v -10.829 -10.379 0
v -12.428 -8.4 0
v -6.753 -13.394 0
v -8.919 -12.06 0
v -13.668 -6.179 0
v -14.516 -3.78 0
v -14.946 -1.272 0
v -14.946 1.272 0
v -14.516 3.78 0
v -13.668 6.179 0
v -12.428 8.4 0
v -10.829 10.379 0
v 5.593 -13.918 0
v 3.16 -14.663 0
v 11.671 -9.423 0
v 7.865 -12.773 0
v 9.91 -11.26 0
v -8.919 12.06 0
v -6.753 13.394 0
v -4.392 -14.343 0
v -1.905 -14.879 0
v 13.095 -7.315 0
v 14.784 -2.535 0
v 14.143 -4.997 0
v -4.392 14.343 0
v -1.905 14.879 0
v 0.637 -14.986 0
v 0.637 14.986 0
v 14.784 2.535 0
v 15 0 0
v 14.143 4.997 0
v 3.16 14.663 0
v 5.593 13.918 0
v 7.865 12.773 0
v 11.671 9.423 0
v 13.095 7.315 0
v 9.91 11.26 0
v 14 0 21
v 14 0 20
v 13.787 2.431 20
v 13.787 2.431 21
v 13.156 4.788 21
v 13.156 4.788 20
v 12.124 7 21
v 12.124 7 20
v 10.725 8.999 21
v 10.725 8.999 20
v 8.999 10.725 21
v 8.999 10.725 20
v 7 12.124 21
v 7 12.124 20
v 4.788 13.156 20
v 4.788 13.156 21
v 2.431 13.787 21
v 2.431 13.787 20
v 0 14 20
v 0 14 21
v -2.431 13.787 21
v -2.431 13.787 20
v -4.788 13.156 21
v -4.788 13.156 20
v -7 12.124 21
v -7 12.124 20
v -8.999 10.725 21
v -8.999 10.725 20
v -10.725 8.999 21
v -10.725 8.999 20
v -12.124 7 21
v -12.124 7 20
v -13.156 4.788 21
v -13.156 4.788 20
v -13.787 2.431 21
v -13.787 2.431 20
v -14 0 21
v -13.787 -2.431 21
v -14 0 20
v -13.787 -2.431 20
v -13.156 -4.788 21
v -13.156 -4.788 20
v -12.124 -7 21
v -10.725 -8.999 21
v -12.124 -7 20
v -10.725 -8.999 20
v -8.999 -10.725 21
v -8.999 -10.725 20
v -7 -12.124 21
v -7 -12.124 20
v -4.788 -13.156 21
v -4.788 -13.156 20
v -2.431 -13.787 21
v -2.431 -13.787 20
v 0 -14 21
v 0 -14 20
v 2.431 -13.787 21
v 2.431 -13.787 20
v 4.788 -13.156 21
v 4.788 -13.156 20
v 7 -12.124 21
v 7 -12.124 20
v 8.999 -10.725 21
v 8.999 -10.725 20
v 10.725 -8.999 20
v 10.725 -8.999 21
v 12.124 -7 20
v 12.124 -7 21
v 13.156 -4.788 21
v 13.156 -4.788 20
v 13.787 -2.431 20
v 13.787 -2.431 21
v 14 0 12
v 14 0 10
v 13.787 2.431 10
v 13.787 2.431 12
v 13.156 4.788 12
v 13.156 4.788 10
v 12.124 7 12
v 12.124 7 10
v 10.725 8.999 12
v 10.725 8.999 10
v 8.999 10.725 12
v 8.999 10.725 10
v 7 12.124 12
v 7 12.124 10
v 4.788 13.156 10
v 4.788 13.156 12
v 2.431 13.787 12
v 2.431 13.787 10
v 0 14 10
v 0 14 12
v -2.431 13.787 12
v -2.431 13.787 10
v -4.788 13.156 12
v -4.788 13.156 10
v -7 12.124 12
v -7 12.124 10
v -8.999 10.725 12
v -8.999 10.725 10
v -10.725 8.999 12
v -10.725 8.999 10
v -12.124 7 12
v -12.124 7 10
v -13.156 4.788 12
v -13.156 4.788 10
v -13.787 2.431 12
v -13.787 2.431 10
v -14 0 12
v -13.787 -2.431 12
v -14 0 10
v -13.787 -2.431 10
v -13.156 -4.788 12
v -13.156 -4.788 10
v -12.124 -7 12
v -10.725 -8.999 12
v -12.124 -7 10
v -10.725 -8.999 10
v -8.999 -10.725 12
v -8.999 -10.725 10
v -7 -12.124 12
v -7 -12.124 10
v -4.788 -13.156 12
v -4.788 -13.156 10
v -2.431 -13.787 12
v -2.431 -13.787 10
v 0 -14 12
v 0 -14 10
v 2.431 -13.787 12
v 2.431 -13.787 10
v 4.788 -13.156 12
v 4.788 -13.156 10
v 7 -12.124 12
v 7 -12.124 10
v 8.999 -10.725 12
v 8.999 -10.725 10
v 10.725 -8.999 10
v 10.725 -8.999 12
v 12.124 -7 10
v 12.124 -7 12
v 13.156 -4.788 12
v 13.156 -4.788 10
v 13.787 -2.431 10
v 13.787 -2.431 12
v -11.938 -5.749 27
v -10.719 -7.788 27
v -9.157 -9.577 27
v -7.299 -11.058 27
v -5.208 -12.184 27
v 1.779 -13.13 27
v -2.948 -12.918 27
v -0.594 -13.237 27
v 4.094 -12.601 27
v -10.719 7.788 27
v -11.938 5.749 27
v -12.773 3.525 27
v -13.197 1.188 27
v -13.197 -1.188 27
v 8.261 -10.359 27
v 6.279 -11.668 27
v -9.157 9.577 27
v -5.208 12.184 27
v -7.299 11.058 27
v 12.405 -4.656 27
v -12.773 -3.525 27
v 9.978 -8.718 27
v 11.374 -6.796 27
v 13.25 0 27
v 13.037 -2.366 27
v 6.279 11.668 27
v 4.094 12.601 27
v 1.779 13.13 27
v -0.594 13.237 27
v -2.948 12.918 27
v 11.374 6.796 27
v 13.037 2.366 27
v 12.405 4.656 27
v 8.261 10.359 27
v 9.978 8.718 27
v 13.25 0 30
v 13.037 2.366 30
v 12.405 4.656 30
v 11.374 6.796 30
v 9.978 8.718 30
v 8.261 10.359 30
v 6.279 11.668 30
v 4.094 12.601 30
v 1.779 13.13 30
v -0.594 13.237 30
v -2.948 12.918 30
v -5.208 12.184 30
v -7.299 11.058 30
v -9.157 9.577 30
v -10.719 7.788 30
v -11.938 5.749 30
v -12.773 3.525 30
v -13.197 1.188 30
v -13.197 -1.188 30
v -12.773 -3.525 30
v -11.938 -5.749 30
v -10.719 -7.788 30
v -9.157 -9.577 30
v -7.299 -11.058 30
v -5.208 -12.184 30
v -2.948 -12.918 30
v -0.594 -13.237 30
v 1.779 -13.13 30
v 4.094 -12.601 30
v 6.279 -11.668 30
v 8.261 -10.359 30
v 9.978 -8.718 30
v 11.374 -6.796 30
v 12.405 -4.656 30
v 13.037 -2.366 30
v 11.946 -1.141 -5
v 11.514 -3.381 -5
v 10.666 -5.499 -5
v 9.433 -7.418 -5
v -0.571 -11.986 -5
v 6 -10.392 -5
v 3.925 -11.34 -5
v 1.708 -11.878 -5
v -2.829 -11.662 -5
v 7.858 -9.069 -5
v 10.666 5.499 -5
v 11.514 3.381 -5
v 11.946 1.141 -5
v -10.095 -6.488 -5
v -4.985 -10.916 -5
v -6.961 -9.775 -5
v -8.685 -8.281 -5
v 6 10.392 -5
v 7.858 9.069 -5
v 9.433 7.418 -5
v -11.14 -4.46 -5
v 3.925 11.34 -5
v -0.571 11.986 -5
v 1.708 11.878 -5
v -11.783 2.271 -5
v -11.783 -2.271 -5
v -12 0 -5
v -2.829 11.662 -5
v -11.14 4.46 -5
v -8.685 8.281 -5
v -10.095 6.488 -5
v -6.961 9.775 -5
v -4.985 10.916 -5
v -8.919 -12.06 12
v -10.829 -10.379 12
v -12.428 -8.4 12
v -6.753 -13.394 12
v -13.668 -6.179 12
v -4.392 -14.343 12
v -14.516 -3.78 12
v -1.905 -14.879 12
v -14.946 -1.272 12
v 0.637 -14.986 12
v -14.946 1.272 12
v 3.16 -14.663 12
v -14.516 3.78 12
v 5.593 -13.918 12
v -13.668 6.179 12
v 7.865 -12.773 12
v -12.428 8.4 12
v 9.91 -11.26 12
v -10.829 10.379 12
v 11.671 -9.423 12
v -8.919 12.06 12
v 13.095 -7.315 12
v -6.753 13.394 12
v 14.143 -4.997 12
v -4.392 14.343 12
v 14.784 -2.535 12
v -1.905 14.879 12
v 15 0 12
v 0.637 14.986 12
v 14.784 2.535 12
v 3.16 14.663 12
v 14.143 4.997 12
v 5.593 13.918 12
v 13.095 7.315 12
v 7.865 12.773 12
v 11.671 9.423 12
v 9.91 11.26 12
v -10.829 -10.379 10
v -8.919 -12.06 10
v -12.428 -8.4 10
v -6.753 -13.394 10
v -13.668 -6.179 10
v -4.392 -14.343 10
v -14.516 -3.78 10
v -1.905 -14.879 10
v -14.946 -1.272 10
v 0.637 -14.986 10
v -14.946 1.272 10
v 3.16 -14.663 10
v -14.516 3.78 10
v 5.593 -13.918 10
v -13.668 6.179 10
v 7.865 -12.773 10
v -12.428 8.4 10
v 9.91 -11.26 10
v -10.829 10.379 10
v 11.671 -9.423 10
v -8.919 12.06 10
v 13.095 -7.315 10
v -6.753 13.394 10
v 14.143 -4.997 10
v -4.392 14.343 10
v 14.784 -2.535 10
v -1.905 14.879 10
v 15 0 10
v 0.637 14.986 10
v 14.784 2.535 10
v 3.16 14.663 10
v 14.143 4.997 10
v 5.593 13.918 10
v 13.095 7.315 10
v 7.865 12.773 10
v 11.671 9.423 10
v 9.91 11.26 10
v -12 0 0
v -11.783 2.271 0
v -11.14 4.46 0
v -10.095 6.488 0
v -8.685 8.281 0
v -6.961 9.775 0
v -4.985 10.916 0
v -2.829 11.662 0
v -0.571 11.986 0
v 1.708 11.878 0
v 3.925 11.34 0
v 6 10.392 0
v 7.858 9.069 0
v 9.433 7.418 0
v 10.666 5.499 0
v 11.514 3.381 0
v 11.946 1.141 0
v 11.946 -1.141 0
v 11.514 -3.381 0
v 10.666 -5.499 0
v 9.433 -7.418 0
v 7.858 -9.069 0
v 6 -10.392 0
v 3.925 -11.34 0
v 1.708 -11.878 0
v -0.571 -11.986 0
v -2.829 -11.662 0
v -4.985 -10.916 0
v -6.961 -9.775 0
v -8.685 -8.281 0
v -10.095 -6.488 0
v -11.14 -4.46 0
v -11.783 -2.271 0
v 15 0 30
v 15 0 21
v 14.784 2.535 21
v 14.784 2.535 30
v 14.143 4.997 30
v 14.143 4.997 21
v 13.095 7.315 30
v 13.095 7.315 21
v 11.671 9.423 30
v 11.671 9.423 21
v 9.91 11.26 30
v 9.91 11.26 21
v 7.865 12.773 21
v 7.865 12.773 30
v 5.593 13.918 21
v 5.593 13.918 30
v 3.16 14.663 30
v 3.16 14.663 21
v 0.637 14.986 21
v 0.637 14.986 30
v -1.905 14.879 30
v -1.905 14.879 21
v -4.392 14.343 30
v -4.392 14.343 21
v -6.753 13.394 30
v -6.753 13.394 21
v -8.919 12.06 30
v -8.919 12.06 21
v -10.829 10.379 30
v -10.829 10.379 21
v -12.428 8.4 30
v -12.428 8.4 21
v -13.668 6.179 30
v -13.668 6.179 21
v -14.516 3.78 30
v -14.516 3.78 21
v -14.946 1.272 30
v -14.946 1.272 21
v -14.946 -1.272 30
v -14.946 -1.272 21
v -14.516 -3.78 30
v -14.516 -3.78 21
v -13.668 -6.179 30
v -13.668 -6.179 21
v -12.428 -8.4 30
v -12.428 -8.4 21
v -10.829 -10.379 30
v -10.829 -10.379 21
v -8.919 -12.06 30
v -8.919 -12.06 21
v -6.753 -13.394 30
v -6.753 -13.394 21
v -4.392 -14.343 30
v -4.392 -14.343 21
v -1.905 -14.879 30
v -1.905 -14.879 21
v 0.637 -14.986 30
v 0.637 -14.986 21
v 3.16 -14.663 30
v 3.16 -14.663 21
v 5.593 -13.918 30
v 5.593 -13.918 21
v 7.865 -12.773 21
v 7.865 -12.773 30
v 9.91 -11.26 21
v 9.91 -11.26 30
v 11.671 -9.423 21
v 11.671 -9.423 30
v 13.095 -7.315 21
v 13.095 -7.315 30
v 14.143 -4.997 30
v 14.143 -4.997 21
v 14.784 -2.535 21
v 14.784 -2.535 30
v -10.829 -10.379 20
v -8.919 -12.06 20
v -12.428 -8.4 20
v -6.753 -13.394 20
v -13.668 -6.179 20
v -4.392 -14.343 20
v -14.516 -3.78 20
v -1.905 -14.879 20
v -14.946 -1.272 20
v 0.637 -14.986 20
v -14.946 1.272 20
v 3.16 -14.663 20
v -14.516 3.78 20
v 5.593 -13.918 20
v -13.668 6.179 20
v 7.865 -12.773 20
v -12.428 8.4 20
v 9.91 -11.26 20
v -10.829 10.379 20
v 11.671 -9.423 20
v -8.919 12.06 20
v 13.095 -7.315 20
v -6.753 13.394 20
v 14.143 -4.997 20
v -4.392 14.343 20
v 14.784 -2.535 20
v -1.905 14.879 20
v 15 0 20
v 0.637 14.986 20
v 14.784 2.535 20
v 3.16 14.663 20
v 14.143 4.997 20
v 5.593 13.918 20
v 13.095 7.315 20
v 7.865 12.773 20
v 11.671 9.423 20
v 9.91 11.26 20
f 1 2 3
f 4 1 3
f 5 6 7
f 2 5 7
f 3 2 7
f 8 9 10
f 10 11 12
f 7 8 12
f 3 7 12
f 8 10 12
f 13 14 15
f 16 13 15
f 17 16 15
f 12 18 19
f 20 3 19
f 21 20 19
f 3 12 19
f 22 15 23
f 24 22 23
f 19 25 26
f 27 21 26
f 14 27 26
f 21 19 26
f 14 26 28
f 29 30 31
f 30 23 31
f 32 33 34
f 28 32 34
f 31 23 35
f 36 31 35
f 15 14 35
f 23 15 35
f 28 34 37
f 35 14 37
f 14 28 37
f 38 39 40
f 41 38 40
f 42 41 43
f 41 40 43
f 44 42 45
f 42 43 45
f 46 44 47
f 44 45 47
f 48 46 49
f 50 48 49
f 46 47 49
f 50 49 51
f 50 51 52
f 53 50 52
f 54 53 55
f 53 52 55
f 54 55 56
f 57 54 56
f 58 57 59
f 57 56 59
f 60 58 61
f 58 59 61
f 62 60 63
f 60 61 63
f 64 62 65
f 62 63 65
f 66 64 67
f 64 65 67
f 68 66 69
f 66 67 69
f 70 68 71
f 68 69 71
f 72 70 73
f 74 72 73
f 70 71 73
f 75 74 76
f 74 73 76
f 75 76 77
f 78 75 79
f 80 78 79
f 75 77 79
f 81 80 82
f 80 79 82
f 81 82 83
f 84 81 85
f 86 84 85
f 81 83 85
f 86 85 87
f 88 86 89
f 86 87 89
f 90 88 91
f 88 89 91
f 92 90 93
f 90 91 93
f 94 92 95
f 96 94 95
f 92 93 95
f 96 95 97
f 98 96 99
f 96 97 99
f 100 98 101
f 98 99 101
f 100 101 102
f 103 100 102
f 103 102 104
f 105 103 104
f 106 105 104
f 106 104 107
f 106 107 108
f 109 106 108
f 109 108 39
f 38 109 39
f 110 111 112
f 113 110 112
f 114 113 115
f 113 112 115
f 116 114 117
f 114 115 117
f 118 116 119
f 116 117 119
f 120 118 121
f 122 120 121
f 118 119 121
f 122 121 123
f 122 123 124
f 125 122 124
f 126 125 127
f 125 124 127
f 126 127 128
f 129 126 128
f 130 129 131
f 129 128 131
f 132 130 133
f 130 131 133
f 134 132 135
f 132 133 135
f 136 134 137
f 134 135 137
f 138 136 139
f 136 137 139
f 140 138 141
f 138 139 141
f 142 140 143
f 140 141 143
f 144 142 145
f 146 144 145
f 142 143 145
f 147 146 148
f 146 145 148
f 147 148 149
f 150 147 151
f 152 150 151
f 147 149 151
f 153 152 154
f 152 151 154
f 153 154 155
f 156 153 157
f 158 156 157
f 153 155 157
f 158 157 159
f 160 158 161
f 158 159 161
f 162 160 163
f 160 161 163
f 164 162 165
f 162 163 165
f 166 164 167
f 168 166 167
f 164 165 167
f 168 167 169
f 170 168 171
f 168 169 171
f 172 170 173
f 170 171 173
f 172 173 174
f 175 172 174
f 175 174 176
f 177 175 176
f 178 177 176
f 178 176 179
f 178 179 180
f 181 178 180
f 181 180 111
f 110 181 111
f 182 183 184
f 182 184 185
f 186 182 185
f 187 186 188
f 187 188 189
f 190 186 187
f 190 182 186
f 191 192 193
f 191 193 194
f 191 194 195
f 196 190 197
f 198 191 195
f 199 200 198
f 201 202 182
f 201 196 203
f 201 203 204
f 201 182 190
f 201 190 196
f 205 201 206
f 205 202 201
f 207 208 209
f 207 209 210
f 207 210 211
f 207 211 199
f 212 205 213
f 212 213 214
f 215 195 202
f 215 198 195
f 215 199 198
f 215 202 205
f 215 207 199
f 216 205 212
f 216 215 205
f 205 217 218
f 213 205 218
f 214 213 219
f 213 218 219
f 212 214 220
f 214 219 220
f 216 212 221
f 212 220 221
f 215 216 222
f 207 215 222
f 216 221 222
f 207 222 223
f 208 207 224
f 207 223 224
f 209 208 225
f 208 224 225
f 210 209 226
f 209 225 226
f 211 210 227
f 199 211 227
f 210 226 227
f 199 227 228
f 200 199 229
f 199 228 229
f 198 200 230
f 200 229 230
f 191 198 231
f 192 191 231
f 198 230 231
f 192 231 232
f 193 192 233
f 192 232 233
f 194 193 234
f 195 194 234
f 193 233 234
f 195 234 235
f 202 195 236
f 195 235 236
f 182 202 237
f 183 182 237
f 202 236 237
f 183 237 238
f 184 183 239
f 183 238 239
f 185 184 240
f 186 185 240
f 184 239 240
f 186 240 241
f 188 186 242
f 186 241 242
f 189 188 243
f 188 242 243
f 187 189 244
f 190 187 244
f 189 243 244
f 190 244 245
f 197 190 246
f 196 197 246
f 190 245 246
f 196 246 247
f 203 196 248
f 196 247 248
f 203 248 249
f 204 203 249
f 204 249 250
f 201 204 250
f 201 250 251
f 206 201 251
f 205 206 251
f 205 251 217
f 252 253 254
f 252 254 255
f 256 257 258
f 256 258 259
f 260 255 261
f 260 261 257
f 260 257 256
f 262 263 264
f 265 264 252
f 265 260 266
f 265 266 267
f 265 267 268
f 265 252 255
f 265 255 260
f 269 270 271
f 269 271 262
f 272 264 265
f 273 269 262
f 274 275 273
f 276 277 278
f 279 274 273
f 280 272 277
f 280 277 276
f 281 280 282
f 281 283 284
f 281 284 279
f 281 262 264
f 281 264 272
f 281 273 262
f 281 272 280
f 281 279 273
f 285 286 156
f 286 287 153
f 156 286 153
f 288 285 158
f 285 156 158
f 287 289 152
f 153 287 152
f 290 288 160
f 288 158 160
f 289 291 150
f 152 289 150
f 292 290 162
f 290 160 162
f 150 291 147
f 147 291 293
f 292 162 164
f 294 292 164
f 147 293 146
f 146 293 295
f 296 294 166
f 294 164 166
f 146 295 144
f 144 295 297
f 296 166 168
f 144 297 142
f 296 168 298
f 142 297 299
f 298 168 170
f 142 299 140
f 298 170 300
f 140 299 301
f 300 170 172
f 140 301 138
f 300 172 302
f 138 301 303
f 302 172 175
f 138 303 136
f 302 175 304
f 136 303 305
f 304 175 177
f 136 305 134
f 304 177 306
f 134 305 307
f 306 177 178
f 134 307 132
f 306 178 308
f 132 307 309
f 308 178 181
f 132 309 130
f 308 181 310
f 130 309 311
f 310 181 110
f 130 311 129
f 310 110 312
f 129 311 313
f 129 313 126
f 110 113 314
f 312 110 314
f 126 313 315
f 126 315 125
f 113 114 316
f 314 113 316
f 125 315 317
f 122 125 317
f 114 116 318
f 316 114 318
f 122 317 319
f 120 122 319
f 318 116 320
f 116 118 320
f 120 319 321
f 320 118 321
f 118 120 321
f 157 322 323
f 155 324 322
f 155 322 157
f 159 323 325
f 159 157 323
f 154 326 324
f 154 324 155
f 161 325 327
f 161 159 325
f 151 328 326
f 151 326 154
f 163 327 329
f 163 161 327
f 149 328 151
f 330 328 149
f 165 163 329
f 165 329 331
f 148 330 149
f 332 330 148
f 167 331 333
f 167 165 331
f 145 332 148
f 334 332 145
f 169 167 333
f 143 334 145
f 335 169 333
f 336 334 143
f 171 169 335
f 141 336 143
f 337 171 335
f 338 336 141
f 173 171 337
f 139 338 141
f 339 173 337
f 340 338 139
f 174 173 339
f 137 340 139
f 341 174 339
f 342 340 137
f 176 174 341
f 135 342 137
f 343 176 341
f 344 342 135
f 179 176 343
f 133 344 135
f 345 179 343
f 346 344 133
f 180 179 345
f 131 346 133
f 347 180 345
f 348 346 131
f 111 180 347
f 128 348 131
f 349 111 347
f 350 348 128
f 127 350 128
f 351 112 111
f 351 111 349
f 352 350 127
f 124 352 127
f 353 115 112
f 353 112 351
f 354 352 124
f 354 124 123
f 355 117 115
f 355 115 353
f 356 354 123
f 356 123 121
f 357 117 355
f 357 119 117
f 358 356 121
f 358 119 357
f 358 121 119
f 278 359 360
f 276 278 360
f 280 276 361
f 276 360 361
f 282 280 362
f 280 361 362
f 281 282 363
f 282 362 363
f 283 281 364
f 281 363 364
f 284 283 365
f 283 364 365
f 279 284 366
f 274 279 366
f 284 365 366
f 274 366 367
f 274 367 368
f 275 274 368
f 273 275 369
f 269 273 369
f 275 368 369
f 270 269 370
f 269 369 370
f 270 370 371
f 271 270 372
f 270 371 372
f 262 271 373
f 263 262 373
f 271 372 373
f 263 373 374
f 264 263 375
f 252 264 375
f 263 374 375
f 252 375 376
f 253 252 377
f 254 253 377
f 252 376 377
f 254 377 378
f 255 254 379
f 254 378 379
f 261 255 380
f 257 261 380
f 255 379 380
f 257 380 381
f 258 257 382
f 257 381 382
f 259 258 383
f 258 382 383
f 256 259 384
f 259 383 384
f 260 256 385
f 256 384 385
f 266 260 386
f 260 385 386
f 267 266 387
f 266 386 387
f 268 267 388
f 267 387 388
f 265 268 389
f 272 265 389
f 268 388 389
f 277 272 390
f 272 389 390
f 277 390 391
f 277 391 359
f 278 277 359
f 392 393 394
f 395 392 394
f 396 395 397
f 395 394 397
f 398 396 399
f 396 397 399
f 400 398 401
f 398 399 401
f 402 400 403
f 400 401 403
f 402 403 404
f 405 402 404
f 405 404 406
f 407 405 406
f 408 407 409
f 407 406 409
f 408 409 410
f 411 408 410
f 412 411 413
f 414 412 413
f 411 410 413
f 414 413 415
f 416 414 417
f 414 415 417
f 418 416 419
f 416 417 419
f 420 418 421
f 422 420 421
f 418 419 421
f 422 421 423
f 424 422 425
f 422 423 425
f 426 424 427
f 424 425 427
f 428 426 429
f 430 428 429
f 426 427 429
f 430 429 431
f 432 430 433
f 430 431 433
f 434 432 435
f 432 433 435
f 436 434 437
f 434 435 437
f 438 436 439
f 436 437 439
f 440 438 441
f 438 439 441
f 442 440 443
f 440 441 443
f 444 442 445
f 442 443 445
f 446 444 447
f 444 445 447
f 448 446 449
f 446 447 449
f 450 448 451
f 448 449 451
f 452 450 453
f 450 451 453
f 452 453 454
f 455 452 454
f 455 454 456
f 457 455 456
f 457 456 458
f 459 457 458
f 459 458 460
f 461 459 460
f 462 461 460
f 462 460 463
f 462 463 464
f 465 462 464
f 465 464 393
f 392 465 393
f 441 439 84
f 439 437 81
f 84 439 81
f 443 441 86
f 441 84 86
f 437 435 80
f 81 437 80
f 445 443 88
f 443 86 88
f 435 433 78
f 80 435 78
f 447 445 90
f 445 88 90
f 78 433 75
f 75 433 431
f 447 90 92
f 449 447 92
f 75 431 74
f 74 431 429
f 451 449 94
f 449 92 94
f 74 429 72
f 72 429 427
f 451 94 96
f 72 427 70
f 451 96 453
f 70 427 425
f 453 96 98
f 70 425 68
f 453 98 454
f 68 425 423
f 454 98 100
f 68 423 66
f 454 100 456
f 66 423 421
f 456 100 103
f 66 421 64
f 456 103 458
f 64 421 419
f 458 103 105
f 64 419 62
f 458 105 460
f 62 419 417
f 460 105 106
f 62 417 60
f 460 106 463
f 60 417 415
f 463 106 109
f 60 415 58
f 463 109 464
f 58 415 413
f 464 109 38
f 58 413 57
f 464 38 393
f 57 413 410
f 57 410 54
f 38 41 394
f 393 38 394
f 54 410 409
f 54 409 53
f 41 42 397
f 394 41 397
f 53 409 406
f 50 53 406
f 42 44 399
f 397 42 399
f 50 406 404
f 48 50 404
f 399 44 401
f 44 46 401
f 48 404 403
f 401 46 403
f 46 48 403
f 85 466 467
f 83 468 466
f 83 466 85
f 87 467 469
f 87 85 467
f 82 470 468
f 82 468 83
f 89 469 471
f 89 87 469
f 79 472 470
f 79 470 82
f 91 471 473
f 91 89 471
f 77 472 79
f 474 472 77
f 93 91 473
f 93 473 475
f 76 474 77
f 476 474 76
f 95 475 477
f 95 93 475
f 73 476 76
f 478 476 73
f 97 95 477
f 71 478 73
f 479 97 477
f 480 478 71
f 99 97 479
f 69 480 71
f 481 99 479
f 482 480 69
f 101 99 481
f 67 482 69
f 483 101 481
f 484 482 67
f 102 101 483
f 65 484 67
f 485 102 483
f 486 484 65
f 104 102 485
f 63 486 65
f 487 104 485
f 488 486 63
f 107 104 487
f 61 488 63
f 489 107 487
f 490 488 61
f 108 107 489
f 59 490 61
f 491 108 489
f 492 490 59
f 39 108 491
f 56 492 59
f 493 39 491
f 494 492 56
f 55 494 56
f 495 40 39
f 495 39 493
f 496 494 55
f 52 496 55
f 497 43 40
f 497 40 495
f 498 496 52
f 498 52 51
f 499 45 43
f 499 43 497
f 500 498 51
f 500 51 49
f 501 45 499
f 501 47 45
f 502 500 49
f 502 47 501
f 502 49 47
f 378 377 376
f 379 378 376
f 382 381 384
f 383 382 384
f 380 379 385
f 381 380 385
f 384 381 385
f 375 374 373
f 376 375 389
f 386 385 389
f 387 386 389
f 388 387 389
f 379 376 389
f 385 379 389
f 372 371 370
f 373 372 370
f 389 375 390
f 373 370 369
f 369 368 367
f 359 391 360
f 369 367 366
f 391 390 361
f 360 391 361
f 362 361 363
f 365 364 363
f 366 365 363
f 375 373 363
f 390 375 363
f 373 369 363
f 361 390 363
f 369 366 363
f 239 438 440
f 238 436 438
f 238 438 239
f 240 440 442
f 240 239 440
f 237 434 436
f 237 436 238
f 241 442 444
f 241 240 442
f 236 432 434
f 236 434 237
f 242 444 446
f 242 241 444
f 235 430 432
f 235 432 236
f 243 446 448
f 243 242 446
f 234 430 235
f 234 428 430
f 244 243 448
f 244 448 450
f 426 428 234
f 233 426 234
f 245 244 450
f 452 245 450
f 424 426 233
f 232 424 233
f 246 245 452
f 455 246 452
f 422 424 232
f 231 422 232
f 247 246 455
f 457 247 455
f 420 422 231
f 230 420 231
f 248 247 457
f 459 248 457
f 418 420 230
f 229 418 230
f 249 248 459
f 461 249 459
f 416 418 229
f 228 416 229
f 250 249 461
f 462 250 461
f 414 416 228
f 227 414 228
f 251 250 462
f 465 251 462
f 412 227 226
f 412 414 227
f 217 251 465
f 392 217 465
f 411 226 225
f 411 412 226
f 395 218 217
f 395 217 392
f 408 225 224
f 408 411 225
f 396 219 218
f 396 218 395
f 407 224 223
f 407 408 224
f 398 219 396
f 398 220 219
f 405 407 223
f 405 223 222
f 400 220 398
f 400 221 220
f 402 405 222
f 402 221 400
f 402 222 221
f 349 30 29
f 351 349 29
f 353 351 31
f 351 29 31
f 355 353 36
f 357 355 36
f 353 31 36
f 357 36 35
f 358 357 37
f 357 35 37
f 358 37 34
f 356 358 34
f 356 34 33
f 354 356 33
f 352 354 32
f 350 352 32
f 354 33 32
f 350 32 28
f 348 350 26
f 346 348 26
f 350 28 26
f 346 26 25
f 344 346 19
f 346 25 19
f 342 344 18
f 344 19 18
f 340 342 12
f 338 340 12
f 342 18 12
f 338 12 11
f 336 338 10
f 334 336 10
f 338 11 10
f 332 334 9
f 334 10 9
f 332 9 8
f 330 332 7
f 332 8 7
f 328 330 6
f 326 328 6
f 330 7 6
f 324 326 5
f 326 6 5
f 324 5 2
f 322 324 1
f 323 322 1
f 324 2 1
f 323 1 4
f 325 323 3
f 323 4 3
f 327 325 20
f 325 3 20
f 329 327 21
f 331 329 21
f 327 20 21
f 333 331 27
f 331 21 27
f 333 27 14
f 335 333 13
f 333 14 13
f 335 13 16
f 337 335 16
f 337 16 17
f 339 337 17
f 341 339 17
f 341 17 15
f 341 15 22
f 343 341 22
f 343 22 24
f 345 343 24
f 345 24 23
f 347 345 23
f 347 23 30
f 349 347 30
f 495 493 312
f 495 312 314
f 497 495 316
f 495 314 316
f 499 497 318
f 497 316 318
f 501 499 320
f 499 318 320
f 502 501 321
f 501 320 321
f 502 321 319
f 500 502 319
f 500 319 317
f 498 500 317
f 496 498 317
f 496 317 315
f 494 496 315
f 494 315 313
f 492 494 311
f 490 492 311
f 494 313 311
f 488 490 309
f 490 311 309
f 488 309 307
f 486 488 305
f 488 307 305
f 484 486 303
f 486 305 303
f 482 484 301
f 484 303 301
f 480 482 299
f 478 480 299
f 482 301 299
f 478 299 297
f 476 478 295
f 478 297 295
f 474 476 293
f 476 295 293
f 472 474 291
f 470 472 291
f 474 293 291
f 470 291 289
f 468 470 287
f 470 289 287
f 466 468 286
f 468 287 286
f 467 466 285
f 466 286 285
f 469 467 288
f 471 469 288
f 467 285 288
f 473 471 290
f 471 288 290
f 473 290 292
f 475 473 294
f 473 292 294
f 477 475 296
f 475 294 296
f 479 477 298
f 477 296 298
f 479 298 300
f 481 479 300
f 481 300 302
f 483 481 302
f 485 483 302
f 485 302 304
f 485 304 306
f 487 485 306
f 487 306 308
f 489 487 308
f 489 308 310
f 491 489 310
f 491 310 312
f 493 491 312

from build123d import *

# Parameters (mm, degrees)
SKETCH1_R           = 15
BASE_DEPTH          = 10
SKETCH2_R           = 14
BOSS_EXTRUDE2_DEPTH = 2
SKETCH3_R           = 15
BOSS_EXTRUDE3_DEPTH = 8
SKETCH4_R           = 14
BOSS_EXTRUDE4_DEPTH = 1
SKETCH5_R           = 15
BOSS_EXTRUDE5_DEPTH = 9
SKETCH6_R           = 13.25
CUT_EXTRUDE1_DEPTH  = 3
SKETCH8_R           = 12
BOSS_EXTRUDE6_DEPTH = 5


with BuildPart() as part:
    # Sketch1 → Base (new body)
    with BuildSketch(Plane.XY):
        Circle(SKETCH1_R)
    extrude(amount=BASE_DEPTH)

    # Sketch2 → Boss-Extrude2 (add)
    with BuildSketch(Plane.XY.offset(10)):
        Circle(SKETCH2_R)
    extrude(amount=BOSS_EXTRUDE2_DEPTH)

    # Sketch3 → Boss-Extrude3 (add)
    with BuildSketch(Plane.XY.offset(12)):
        Circle(SKETCH3_R)
    extrude(amount=BOSS_EXTRUDE3_DEPTH)

    # Sketch4 → Boss-Extrude4 (add)
    with BuildSketch(Plane.XY.offset(20)):
        Circle(SKETCH4_R)
    extrude(amount=BOSS_EXTRUDE4_DEPTH)

    # Sketch5 → Boss-Extrude5 (add)
    with BuildSketch(Plane.XY.offset(21)):
        Circle(SKETCH5_R)
    extrude(amount=BOSS_EXTRUDE5_DEPTH)

    # Sketch6 → Cut-Extrude1 (cut)
    with BuildSketch(Plane.XY.offset(30)):
        Circle(SKETCH6_R)
    extrude(amount=-CUT_EXTRUDE1_DEPTH, mode=Mode.SUBTRACT)


with BuildPart() as body_2:
    # Sketch8 → Boss-Extrude6 (new body)
    with BuildSketch(Plane(origin=(0, 0, 0), x_dir=(-1, 0, 0), z_dir=(0, 0, -1))):
        Circle(SKETCH8_R)
    extrude(amount=BOSS_EXTRUDE6_DEPTH)


solid = Compound([part.part, body_2.part])
